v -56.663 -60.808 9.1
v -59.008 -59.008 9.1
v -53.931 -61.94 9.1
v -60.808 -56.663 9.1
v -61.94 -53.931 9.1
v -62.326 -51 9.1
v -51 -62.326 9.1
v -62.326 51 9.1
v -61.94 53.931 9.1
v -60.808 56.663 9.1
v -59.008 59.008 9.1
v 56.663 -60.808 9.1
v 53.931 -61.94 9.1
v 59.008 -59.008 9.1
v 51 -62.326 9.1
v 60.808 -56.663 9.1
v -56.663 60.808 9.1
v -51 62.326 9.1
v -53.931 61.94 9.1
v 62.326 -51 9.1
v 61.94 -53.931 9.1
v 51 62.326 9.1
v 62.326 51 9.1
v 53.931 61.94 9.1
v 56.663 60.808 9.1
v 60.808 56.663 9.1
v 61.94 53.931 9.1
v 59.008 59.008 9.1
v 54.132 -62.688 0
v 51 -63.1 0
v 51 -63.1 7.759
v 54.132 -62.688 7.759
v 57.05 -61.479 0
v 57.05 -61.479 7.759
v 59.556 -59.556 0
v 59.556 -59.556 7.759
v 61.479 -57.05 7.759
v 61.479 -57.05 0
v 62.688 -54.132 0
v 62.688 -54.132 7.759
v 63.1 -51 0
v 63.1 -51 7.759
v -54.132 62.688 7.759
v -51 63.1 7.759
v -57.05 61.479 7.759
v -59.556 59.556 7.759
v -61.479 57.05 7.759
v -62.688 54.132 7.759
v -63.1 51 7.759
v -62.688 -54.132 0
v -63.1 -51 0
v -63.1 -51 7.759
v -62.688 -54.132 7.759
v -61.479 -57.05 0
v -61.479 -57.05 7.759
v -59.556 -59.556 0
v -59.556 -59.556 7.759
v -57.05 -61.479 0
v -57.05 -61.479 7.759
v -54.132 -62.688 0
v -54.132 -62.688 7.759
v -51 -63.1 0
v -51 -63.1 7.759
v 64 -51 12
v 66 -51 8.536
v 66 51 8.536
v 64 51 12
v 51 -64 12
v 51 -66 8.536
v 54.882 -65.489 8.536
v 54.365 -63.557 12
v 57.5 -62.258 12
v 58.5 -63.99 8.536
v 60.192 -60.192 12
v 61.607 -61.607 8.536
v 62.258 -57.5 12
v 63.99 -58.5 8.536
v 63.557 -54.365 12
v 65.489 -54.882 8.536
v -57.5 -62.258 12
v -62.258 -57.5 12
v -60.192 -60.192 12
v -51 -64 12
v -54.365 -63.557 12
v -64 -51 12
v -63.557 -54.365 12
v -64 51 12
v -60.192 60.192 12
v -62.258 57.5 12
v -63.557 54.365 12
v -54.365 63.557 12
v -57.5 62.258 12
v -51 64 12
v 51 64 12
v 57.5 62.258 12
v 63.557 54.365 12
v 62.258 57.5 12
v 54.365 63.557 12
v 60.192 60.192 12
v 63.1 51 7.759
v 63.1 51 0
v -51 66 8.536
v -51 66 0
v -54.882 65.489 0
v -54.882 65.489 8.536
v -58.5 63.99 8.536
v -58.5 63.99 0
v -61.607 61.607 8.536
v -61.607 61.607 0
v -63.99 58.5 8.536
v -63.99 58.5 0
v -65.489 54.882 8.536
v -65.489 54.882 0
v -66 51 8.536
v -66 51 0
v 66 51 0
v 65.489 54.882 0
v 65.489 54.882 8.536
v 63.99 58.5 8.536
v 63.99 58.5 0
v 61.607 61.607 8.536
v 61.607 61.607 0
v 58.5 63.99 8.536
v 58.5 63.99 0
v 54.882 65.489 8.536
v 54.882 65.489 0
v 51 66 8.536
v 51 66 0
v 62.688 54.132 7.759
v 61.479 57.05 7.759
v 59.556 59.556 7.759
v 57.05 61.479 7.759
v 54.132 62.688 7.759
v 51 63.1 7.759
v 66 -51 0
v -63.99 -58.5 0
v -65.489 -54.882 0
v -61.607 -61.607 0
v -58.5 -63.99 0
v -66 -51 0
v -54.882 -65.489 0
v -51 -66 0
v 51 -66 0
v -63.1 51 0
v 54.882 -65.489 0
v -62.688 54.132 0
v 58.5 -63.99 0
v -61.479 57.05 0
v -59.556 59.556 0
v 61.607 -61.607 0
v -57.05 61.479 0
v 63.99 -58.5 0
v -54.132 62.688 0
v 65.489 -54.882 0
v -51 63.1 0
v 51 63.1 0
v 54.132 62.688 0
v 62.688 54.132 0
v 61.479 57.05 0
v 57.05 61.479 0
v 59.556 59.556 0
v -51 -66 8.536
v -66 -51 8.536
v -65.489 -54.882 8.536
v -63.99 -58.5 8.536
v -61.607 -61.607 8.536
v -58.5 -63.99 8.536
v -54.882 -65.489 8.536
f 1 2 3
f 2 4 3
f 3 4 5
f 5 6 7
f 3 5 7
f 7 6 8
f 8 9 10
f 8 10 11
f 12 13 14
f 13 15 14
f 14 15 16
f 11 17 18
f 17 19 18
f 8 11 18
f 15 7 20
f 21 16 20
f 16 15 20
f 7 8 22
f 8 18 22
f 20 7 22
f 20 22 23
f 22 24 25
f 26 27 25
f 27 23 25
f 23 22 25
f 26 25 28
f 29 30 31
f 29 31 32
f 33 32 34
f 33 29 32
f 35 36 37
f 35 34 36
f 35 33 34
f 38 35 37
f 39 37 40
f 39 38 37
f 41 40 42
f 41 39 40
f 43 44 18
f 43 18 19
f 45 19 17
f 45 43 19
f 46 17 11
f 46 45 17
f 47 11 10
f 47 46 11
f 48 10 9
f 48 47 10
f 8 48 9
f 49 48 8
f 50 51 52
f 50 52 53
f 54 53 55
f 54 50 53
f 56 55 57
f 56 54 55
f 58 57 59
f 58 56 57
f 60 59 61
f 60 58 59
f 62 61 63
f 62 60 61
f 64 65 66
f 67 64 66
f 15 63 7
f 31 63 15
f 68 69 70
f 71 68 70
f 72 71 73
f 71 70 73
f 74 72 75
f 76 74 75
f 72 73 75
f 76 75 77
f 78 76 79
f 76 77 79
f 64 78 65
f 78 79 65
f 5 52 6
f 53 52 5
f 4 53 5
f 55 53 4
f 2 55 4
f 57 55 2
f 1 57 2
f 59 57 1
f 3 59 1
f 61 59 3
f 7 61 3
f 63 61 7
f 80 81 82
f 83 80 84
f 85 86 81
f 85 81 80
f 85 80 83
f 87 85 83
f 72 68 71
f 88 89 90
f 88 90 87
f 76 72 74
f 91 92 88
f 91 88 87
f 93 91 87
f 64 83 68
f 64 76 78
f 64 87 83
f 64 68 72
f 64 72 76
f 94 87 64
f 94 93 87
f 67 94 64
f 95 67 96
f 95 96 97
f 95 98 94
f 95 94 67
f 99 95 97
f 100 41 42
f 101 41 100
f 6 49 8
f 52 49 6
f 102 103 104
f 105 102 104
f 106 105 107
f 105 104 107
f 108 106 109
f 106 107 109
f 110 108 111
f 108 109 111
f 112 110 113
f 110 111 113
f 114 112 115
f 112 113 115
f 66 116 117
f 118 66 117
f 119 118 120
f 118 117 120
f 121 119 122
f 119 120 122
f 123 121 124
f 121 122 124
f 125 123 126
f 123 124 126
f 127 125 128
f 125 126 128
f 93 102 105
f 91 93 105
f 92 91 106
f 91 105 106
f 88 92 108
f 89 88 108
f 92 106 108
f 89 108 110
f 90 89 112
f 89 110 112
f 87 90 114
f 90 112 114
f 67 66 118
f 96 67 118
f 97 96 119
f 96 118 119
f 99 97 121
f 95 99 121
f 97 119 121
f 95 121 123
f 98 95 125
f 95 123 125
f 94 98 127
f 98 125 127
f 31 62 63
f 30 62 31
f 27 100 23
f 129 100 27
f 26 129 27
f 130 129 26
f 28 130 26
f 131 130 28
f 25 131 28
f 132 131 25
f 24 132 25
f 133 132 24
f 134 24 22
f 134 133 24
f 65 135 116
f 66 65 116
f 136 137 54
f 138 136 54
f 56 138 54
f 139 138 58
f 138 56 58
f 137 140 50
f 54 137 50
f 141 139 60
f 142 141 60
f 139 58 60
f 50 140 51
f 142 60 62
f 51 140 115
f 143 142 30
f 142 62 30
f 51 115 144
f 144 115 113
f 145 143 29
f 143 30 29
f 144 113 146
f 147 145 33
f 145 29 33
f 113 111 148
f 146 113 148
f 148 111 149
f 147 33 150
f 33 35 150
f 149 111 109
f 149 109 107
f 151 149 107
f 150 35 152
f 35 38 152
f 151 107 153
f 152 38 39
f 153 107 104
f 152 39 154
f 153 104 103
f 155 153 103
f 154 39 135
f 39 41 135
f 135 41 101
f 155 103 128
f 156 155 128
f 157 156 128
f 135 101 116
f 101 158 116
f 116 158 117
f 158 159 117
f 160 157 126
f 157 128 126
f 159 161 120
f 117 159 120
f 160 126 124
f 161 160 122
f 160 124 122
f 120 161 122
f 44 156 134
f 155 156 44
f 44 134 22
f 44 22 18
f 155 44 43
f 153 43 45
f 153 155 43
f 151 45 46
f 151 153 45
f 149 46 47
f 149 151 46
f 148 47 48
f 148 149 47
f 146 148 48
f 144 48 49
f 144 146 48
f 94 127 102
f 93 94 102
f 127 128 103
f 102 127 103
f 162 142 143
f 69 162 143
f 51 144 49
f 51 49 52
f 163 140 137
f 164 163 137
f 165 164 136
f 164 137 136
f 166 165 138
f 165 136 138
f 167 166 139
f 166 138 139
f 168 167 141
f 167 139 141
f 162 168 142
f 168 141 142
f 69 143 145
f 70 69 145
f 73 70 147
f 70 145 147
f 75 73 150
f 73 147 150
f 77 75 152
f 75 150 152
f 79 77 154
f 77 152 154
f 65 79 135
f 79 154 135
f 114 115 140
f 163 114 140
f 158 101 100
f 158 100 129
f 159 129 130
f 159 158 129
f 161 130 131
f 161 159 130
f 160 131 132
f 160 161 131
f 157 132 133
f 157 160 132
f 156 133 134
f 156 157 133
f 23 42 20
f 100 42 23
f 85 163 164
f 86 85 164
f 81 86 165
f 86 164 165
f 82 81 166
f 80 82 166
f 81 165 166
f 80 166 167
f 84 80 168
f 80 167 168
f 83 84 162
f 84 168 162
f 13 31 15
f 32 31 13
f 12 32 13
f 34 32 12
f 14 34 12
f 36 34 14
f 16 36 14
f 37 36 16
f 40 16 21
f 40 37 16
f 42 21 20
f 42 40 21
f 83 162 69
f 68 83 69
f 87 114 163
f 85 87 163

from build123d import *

# Parameters (mm, degrees)
F1_DEPTH = 12
F2_SIZE2 = 3.4641016151
F2_SIZE  = 2
F3_T     = -2.9


with BuildPart() as f1:
    # F0 (on Top) → F1 (new body)
    with BuildSketch(Plane.XY):
        with BuildLine():
            ThreePointArc((-66, -51), (-61.6066017178, -61.6066017178), (-51, -66))
            Line((-51, -66), (51, -66))
            ThreePointArc((51, -66), (61.6066017178, -61.6066017178), (66, -51))
            Line((66, -51), (66, 51))
            ThreePointArc((66, 51), (61.6066017178, 61.6066017178), (51, 66))
            Line((51, 66), (-51, 66))
            ThreePointArc((-51, 66), (-61.6066017178, 61.6066017178), (-66, 51))
            Line((-66, 51), (-66, -51))
        make_face()
    extrude(amount=F1_DEPTH)

    # F2
    f2_edges = [f1.edges().sort_by_distance(p)[0] for p in [
        (0, -66, 12),
    ]]
    f2_side = f1.faces().sort_by_distance((0, 0, 12))[0]
    chamfer(f2_edges, length=F2_SIZE, length2=F2_SIZE2, reference=f2_side)

    # F3
    f3_openings = [f1.faces().sort_by_distance(p)[0] for p in [
        (0, 0, 0),
    ]]
    offset(amount=F3_T, openings=f3_openings)


solid = f1.part
